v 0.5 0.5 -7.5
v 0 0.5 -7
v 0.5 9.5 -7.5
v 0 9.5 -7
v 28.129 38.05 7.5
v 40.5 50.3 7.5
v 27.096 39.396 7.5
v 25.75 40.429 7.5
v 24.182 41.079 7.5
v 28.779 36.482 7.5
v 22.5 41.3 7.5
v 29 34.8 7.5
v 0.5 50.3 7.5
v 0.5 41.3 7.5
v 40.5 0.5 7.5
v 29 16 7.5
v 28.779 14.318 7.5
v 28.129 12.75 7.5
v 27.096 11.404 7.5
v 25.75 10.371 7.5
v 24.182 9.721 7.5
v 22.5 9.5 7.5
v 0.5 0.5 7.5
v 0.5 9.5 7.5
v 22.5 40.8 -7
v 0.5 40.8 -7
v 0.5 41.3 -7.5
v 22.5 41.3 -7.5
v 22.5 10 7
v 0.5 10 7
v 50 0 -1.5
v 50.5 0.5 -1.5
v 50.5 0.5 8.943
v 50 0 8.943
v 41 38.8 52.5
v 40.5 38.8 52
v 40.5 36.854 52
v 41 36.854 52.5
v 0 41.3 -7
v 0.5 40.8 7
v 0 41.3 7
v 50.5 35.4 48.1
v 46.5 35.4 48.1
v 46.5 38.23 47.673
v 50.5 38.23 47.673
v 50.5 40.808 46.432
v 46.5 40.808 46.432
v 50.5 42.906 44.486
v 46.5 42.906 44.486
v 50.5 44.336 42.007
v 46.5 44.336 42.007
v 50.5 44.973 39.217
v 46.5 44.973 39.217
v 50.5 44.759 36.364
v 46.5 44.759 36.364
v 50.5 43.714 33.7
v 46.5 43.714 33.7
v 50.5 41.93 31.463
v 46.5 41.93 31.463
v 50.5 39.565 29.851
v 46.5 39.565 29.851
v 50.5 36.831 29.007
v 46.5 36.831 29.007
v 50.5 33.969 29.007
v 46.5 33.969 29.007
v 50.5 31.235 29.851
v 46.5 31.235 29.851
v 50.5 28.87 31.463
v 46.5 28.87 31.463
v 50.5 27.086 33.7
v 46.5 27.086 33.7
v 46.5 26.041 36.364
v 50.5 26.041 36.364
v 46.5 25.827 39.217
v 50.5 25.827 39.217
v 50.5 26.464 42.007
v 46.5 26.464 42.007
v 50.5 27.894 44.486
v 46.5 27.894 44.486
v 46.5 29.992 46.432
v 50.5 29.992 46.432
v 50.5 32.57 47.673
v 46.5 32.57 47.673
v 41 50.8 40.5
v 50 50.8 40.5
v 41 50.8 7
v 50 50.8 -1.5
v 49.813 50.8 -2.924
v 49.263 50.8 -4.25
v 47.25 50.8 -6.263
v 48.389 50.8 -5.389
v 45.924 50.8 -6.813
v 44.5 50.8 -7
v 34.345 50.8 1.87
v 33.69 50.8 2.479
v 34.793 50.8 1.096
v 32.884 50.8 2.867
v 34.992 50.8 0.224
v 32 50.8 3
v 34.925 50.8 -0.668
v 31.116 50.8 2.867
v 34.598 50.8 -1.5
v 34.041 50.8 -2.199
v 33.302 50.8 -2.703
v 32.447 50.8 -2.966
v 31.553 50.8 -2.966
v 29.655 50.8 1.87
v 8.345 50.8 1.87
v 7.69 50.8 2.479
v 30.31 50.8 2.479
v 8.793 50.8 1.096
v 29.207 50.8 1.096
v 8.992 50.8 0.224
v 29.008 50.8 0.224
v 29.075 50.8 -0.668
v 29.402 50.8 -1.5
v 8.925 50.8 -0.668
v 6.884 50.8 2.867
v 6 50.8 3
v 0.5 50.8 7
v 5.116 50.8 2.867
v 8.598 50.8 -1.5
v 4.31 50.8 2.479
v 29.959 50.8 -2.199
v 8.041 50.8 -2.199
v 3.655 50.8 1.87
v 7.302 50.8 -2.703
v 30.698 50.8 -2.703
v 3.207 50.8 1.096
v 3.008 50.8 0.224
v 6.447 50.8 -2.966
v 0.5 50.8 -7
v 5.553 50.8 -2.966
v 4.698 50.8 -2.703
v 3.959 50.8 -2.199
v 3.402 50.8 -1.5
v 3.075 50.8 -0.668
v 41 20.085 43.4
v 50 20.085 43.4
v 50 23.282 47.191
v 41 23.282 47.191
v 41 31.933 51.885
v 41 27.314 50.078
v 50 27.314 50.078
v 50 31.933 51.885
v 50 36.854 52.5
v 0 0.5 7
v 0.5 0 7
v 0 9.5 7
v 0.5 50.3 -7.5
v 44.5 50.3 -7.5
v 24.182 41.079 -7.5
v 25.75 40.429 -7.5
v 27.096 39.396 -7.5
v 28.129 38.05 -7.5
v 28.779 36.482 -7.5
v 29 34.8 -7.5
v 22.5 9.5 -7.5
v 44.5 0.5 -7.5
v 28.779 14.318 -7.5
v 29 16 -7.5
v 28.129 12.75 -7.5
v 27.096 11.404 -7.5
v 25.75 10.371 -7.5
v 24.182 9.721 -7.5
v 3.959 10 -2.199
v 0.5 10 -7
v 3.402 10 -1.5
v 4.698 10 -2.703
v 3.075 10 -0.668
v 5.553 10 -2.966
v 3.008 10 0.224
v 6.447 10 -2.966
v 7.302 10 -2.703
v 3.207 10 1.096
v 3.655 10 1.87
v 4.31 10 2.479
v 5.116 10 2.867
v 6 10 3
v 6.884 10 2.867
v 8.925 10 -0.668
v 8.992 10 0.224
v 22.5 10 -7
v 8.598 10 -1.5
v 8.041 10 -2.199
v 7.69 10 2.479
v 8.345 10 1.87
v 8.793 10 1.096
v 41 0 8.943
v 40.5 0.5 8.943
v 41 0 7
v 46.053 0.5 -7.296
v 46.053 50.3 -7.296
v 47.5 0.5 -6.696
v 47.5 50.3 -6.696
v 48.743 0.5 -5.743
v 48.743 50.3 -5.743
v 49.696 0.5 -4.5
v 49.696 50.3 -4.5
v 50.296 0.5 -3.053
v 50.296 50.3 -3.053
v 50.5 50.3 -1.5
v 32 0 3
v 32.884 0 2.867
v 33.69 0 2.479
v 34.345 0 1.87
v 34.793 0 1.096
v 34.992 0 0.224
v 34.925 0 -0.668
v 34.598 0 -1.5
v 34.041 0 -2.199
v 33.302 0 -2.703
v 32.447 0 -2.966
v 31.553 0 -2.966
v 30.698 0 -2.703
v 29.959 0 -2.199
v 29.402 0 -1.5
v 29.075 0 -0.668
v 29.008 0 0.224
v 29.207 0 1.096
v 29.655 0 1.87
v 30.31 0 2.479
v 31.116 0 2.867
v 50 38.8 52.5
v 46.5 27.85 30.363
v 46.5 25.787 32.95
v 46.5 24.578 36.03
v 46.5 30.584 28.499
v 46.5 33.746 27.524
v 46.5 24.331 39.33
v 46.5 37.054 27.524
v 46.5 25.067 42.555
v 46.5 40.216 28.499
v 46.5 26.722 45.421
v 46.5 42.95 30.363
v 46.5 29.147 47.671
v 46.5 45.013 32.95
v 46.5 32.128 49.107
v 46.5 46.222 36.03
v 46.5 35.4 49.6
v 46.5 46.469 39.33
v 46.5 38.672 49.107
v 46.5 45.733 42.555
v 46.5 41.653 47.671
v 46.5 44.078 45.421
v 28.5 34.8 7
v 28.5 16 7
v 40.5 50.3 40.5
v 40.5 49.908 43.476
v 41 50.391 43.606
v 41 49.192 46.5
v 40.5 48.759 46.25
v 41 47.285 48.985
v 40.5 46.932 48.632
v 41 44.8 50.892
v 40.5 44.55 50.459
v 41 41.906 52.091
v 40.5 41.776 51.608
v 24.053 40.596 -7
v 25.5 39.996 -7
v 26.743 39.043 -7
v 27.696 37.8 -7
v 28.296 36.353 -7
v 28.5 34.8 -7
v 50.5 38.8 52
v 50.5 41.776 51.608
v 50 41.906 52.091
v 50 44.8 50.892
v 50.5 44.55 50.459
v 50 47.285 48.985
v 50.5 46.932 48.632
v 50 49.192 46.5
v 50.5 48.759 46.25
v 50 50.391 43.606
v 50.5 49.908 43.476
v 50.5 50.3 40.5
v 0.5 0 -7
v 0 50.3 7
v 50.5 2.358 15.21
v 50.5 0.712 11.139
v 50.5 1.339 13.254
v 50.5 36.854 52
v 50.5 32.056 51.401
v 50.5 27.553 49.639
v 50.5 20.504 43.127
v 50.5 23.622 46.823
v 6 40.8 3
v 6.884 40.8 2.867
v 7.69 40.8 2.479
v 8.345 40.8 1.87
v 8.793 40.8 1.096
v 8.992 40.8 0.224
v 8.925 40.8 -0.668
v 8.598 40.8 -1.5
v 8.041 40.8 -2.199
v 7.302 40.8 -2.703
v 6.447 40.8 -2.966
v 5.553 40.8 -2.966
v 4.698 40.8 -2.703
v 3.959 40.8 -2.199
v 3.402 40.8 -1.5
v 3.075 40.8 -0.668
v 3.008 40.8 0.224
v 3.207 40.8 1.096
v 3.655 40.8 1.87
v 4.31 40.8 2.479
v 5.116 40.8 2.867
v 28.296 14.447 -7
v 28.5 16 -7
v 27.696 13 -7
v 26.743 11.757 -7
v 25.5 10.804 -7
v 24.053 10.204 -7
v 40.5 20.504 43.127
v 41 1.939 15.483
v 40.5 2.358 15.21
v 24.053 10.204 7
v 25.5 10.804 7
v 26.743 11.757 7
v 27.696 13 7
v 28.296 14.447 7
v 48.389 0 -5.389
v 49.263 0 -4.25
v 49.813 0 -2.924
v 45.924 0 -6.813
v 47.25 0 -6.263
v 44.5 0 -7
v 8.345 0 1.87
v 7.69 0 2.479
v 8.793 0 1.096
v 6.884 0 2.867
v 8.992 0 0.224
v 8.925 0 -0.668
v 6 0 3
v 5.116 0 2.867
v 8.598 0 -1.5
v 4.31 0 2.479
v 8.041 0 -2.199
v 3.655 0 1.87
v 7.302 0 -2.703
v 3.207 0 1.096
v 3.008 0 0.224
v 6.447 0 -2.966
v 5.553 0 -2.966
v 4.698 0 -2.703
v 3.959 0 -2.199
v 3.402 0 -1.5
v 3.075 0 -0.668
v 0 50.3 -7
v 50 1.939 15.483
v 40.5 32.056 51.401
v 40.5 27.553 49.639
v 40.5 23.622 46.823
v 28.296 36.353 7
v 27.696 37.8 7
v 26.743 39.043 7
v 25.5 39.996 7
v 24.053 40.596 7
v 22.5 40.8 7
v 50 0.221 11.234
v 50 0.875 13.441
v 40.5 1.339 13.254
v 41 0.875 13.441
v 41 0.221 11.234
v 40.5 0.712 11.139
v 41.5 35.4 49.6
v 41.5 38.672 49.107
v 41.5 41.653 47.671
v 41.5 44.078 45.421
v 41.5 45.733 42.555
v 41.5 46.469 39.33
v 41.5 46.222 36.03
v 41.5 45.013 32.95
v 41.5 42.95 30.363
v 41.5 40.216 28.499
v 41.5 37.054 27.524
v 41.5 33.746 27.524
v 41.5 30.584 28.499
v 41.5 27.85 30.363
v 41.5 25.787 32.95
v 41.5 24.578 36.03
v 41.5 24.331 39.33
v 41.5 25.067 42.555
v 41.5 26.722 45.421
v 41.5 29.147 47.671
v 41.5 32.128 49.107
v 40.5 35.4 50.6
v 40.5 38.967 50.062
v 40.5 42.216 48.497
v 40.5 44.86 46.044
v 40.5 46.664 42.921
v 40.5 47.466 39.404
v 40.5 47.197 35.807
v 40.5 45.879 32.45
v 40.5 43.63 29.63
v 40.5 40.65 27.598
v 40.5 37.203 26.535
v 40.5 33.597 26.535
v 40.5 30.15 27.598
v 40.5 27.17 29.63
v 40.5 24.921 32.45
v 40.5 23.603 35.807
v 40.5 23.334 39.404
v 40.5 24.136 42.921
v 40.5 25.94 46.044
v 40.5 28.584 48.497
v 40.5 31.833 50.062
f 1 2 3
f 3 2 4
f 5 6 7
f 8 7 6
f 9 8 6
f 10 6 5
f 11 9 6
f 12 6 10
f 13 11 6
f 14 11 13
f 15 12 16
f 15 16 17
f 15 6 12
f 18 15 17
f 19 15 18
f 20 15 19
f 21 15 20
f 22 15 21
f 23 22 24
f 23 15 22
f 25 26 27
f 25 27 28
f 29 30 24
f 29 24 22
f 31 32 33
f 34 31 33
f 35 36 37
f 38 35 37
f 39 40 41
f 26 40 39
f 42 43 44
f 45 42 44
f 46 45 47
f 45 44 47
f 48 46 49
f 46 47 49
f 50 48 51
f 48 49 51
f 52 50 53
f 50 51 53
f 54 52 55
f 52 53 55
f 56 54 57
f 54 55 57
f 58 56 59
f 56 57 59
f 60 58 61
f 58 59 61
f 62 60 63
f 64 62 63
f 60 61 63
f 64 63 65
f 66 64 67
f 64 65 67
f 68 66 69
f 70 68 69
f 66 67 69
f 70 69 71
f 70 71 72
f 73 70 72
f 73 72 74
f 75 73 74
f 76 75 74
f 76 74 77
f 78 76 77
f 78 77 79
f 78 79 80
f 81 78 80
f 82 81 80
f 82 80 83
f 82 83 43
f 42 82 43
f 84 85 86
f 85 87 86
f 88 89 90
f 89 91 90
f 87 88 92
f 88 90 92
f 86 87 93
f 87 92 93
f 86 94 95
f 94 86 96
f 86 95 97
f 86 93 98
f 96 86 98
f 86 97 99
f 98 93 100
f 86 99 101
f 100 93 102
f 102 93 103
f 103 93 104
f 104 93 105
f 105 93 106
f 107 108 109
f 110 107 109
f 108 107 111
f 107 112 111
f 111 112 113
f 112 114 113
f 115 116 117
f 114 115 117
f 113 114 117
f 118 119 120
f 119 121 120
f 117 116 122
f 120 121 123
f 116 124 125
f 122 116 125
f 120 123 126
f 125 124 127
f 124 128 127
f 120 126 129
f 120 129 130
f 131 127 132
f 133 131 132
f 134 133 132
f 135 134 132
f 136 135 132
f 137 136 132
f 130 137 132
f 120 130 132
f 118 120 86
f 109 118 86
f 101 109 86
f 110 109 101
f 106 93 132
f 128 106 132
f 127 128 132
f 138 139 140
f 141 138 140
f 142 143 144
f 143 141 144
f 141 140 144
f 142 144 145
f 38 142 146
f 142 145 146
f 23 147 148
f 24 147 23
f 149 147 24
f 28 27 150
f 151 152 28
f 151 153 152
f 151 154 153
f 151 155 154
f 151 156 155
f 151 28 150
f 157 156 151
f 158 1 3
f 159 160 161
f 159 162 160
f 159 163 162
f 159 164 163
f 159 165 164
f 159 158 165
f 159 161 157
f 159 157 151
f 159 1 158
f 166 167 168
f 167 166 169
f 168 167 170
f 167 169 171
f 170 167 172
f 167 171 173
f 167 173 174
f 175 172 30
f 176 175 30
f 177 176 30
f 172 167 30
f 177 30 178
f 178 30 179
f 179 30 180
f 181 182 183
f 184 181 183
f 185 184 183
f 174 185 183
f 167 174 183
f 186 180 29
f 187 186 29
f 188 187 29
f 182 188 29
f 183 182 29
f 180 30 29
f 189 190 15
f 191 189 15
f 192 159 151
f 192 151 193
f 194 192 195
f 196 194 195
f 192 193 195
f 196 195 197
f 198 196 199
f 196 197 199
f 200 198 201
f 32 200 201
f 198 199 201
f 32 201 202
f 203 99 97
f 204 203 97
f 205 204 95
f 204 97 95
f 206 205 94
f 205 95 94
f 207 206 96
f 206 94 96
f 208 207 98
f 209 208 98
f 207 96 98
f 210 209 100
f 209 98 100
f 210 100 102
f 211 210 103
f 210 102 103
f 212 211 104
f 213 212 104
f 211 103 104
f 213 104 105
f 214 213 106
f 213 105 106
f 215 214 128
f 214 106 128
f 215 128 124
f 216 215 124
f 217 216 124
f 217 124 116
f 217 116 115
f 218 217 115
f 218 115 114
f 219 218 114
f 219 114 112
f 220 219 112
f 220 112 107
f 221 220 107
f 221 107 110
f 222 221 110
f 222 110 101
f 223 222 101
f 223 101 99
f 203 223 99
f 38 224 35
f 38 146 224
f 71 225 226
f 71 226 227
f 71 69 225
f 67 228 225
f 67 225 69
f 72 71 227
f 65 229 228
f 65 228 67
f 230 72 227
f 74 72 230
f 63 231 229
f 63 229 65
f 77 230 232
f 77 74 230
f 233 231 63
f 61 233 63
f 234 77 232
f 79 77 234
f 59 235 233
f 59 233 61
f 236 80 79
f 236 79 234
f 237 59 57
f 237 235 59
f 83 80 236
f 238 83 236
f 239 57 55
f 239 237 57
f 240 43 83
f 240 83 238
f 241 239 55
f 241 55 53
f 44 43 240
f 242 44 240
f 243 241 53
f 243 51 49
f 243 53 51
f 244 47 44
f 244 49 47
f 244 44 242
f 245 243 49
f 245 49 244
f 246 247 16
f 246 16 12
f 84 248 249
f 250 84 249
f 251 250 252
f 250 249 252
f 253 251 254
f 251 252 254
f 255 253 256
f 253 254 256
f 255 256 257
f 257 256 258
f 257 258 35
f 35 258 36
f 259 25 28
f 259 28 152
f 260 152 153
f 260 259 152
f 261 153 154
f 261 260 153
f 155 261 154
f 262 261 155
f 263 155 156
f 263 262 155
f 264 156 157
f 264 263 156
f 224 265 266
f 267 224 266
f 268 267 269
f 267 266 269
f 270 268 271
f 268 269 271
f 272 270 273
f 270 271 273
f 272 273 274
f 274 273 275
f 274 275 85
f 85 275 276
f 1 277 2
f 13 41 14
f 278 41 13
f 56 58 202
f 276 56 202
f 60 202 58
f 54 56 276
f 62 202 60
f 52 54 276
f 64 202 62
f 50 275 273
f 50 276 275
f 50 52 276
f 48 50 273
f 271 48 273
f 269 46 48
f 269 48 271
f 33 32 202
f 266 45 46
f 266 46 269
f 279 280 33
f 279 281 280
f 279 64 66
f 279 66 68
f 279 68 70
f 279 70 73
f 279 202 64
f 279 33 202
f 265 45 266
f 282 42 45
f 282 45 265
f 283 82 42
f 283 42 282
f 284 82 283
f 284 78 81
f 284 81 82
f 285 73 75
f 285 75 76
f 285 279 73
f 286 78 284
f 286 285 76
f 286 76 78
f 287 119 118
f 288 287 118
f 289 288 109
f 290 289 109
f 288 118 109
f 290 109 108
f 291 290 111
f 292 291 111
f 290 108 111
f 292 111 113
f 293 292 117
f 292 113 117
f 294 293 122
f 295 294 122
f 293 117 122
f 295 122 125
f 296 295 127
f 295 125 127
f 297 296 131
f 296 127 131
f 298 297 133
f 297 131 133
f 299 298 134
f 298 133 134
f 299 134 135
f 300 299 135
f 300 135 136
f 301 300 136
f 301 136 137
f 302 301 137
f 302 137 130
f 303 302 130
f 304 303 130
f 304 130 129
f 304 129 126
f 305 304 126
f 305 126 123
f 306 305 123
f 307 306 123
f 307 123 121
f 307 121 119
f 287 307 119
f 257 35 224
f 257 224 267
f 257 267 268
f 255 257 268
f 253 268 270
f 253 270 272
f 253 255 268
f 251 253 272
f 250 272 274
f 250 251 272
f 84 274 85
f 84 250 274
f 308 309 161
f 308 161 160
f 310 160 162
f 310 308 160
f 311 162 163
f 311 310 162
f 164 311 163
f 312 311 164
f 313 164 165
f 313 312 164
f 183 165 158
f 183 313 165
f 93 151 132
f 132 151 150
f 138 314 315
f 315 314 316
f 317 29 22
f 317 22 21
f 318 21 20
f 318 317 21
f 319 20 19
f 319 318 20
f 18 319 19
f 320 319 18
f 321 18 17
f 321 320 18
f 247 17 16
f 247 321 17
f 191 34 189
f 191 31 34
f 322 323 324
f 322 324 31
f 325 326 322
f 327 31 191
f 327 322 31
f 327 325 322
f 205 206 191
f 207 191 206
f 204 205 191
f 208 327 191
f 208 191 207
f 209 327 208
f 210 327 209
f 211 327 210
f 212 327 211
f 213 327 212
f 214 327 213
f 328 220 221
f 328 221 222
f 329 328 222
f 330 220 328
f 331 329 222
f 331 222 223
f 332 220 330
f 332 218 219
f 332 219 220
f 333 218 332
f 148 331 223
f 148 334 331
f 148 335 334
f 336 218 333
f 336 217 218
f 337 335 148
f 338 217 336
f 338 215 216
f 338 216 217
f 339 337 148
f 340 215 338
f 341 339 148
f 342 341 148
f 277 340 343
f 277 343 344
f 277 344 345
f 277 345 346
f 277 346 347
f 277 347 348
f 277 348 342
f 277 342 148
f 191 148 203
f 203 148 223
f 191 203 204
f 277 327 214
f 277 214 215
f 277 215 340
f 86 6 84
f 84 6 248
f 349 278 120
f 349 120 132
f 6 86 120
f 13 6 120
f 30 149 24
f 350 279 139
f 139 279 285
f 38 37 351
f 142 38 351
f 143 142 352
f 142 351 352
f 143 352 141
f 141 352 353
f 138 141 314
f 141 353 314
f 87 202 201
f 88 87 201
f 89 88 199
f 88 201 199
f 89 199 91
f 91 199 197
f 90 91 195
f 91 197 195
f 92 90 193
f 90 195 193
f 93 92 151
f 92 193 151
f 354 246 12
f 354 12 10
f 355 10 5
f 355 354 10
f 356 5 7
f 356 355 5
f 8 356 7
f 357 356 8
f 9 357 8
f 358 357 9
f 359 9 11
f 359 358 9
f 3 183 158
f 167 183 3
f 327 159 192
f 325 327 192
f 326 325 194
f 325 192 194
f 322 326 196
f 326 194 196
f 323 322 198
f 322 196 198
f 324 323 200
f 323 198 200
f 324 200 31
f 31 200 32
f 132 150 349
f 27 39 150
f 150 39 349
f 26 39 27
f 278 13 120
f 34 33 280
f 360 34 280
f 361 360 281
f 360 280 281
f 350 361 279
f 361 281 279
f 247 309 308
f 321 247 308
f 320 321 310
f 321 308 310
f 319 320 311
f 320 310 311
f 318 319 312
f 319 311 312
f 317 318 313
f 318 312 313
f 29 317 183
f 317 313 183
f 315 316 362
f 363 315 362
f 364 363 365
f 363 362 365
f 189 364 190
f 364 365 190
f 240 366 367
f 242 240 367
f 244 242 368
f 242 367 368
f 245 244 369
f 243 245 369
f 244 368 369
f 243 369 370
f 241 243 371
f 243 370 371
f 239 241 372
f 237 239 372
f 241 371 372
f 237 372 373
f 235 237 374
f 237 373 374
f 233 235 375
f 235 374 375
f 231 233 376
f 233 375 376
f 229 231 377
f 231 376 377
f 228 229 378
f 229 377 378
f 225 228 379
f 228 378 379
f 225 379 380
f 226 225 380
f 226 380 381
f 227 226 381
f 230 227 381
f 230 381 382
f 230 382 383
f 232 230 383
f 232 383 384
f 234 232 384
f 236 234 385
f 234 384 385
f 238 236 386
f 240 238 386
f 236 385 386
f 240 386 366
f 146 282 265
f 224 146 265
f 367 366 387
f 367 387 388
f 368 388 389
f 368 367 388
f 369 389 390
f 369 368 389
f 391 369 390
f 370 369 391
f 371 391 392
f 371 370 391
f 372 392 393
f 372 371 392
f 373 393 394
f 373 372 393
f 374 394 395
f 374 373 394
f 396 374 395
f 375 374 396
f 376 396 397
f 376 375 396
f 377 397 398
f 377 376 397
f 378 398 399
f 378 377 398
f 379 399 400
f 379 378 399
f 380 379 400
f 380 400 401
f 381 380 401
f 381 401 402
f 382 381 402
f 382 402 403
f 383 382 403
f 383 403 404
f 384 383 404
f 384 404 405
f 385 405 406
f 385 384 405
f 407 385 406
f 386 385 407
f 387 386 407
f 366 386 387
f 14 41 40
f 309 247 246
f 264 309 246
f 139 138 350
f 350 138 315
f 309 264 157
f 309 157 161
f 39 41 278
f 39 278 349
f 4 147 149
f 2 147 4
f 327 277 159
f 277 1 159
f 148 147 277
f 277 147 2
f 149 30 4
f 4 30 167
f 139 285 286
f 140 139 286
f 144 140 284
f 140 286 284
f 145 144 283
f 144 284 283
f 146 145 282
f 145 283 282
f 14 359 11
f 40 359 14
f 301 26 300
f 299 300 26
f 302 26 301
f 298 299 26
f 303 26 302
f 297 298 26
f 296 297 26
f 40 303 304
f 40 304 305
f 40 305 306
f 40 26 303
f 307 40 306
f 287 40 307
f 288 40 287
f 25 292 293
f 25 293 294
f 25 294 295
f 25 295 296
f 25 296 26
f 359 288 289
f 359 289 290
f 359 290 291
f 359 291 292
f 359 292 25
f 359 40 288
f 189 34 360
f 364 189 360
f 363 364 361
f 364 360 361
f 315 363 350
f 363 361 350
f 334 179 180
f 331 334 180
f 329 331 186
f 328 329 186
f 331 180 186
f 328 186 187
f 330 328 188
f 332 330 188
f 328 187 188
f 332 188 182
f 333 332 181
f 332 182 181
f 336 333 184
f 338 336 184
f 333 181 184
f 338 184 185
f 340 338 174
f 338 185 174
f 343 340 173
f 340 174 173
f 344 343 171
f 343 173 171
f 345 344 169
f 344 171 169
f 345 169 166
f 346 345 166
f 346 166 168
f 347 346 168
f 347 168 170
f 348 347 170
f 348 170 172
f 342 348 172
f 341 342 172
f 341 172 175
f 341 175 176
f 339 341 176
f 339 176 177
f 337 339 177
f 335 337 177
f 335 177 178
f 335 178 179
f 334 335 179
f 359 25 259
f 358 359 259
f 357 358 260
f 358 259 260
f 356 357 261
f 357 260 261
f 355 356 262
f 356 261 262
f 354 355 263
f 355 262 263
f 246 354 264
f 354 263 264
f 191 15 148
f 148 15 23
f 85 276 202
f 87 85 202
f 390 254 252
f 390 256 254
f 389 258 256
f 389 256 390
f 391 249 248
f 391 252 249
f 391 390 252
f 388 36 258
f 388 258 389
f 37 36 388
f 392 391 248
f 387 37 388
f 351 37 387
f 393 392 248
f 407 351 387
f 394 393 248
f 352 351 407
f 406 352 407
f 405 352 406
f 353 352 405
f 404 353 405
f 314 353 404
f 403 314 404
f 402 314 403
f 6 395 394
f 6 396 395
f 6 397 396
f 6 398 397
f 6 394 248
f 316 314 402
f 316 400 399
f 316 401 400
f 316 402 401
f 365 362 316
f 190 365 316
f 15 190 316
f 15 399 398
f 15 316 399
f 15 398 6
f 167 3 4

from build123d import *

# Parameters (mm, degrees)
BOSS_EXTRUDE1_DEPTH = 50.8
SKETCH3_R           = 11.1
CUT_EXTRUDE1_DEPTH  = 6
SKETCH4_R           = 9.6
CUT_EXTRUDE2_DEPTH  = 87.597575024
CUT_EXTRUDE3_DEPTH  = 84.529276305
FILLET1_R           = 20
FILLET2_R           = 12
SKETCH6_R           = 3
CUT_EXTRUDE4_DEPTH  = 89.809571556
SKETCH7_W           = 28.5
SKETCH7_H           = 30.8
CUT_EXTRUDE5_DEPTH  = 85.592493757
FILLET3_R           = 6
FILLET4_R           = 6
FILLET5_R           = 12
CHAMFER1_SIZE       = 0.5
CHAMFER2_SIZE       = 1


with BuildPart() as part:
    # Sketch2 → Boss-Extrude1 (new body)
    with BuildSketch(Plane(origin=(0, 0, 0), x_dir=(1, 0, 0), z_dir=(0, 1, 0))):
        Polygon((0, 7.5), (50.5, 7.5), (50.5, -52.5), (40.5, -52.5), (40.5, -7.5), (0, -7.5), align=None)
    extrude(amount=BOSS_EXTRUDE1_DEPTH)

    # Sketch3 → Cut-Extrude1 (cut)
    with BuildSketch(Plane.ZY.offset(-40.5)):
        with Locations((38.5, 35.4)):
            Circle(SKETCH3_R)
    extrude(amount=-CUT_EXTRUDE1_DEPTH, mode=Mode.SUBTRACT)

    # Sketch4 → Cut-Extrude2 (cut, through all)
    with BuildSketch(Plane.ZY.offset(-46.5)):
        with Locations((38.5, 35.4)):
            Circle(SKETCH4_R)
    extrude(amount=-CUT_EXTRUDE2_DEPTH, mode=Mode.SUBTRACT)

    # Sketch5 → Cut-Extrude3 (cut, through all)
    with BuildSketch(Plane.ZY.offset(-40.5)):
        Polygon((12.5, 0), (52.5, 0), (52.5, 26), align=None)
    extrude(amount=-CUT_EXTRUDE3_DEPTH, mode=Mode.SUBTRACT)

    # Fillet1
    fillet1_edges = [part.edges().sort_by_distance(p)[0] for p in [
        (45.5, 26, 52.5),
    ]]
    fillet(fillet1_edges, radius=FILLET1_R)

    # Fillet2
    fillet2_edges = [part.edges().sort_by_distance(p)[0] for p in [
        (45.5, 50.8, 52.5),
    ]]
    fillet(fillet2_edges, radius=FILLET2_R)

    # Sketch6 → Cut-Extrude4 (cut, through all)
    with BuildSketch(Plane(origin=(0, 50.8, 0), x_dir=(1, 0, 0), z_dir=(0, 1, 0))):
        with Locations(Location((6, 0, 0), (0, 0, 270))):
            Circle(SKETCH6_R)
        with Locations(Location((32, 0, 0), (0, 0, 270))):
            Circle(SKETCH6_R)
    extrude(amount=-CUT_EXTRUDE4_DEPTH, mode=Mode.SUBTRACT)

    # Sketch7 → Cut-Extrude5 (cut, through all)
    with BuildSketch(Plane.XY.offset(7.5)):
        with Locations((14.25, 25.4)):
            Rectangle(SKETCH7_W, SKETCH7_H)
    extrude(amount=-CUT_EXTRUDE5_DEPTH, mode=Mode.SUBTRACT)

    # Fillet3
    fillet3_edges = [part.edges().sort_by_distance(p)[0] for p in [
        (28.5, 10, 0),
        (28.5, 40.8, 0),
    ]]
    fillet(fillet3_edges, radius=FILLET3_R)

    # Fillet4
    fillet4_edges = [part.edges().sort_by_distance(p)[0] for p in [
        (50.5, 25.4, -7.5),
    ]]
    fillet(fillet4_edges, radius=FILLET4_R)

    # Fillet5
    fillet5_edges = [part.edges().sort_by_distance(p)[0] for p in [
        (45.5, 0, 12.5),
    ]]
    fillet(fillet5_edges, radius=FILLET5_R)

    # Chamfer1
    chamfer1_edges = [part.edges().sort_by_distance(p)[0] for p in [
        (48.742640687, 0, -5.742640687),
        (50.5, 50.8, 19.5),
        (48.742640687, 50.8, -5.742640687),
        (40.5, 0, 8.221359592),
        (40.5, 0.4948733, 12.353299725),
        (50.5, 0.4948733, 12.353299725),
        (0, 45.8, -7.5),
        (0, 45.8, 7.5),
        (20.25, 50.8, 7.5),
        (0, 50.8, 0),
        (40.5, 11.011762581, 29.441173202),
        (50.5, 11.011762581, 29.441173202),
        (40.5, 27.314206751, 50.07832956),
        (50.5, 27.314206751, 50.07832956),
        (40.5, 37.826860442, 52.5),
        (50.5, 37.826860442, 52.5),
        (40.5, 50.8, 24),
        (22.25, 50.8, -7.5),
        (40.5, 47.285281374, 48.985281374),
        (50.5, 47.285281374, 48.985281374),
        (0, 5, 7.5),
        (0, 0, 0),
        (0, 5, -7.5),
        (20.25, 0, 7.5),
        (0, 40.8, 0),
        (11.25, 10, -7.5),
        (0, 10, 0),
        (11.25, 10, 7.5),
        (11.25, 40.8, 7.5),
        (11.25, 40.8, -7.5),
        (28.5, 25.4, 7.5),
        (28.5, 25.4, -7.5),
        (22.25, 0, -7.5),
        (26.742640687, 39.042640687, 7.5),
        (26.742640687, 39.042640687, -7.5),
        (26.742640687, 11.757359313, 7.5),
        (26.742640687, 11.757359313, -7.5),
        (50.5, 0, 3.721359592),
    ]]
    chamfer(chamfer1_edges, length=CHAMFER1_SIZE)

    # Chamfer2
    chamfer2_edges = [part.edges().sort_by_distance(p)[0] for p in [
        (40.5, 35.4, 27.4),
    ]]
    chamfer(chamfer2_edges, length=CHAMFER2_SIZE)


solid = part.part
